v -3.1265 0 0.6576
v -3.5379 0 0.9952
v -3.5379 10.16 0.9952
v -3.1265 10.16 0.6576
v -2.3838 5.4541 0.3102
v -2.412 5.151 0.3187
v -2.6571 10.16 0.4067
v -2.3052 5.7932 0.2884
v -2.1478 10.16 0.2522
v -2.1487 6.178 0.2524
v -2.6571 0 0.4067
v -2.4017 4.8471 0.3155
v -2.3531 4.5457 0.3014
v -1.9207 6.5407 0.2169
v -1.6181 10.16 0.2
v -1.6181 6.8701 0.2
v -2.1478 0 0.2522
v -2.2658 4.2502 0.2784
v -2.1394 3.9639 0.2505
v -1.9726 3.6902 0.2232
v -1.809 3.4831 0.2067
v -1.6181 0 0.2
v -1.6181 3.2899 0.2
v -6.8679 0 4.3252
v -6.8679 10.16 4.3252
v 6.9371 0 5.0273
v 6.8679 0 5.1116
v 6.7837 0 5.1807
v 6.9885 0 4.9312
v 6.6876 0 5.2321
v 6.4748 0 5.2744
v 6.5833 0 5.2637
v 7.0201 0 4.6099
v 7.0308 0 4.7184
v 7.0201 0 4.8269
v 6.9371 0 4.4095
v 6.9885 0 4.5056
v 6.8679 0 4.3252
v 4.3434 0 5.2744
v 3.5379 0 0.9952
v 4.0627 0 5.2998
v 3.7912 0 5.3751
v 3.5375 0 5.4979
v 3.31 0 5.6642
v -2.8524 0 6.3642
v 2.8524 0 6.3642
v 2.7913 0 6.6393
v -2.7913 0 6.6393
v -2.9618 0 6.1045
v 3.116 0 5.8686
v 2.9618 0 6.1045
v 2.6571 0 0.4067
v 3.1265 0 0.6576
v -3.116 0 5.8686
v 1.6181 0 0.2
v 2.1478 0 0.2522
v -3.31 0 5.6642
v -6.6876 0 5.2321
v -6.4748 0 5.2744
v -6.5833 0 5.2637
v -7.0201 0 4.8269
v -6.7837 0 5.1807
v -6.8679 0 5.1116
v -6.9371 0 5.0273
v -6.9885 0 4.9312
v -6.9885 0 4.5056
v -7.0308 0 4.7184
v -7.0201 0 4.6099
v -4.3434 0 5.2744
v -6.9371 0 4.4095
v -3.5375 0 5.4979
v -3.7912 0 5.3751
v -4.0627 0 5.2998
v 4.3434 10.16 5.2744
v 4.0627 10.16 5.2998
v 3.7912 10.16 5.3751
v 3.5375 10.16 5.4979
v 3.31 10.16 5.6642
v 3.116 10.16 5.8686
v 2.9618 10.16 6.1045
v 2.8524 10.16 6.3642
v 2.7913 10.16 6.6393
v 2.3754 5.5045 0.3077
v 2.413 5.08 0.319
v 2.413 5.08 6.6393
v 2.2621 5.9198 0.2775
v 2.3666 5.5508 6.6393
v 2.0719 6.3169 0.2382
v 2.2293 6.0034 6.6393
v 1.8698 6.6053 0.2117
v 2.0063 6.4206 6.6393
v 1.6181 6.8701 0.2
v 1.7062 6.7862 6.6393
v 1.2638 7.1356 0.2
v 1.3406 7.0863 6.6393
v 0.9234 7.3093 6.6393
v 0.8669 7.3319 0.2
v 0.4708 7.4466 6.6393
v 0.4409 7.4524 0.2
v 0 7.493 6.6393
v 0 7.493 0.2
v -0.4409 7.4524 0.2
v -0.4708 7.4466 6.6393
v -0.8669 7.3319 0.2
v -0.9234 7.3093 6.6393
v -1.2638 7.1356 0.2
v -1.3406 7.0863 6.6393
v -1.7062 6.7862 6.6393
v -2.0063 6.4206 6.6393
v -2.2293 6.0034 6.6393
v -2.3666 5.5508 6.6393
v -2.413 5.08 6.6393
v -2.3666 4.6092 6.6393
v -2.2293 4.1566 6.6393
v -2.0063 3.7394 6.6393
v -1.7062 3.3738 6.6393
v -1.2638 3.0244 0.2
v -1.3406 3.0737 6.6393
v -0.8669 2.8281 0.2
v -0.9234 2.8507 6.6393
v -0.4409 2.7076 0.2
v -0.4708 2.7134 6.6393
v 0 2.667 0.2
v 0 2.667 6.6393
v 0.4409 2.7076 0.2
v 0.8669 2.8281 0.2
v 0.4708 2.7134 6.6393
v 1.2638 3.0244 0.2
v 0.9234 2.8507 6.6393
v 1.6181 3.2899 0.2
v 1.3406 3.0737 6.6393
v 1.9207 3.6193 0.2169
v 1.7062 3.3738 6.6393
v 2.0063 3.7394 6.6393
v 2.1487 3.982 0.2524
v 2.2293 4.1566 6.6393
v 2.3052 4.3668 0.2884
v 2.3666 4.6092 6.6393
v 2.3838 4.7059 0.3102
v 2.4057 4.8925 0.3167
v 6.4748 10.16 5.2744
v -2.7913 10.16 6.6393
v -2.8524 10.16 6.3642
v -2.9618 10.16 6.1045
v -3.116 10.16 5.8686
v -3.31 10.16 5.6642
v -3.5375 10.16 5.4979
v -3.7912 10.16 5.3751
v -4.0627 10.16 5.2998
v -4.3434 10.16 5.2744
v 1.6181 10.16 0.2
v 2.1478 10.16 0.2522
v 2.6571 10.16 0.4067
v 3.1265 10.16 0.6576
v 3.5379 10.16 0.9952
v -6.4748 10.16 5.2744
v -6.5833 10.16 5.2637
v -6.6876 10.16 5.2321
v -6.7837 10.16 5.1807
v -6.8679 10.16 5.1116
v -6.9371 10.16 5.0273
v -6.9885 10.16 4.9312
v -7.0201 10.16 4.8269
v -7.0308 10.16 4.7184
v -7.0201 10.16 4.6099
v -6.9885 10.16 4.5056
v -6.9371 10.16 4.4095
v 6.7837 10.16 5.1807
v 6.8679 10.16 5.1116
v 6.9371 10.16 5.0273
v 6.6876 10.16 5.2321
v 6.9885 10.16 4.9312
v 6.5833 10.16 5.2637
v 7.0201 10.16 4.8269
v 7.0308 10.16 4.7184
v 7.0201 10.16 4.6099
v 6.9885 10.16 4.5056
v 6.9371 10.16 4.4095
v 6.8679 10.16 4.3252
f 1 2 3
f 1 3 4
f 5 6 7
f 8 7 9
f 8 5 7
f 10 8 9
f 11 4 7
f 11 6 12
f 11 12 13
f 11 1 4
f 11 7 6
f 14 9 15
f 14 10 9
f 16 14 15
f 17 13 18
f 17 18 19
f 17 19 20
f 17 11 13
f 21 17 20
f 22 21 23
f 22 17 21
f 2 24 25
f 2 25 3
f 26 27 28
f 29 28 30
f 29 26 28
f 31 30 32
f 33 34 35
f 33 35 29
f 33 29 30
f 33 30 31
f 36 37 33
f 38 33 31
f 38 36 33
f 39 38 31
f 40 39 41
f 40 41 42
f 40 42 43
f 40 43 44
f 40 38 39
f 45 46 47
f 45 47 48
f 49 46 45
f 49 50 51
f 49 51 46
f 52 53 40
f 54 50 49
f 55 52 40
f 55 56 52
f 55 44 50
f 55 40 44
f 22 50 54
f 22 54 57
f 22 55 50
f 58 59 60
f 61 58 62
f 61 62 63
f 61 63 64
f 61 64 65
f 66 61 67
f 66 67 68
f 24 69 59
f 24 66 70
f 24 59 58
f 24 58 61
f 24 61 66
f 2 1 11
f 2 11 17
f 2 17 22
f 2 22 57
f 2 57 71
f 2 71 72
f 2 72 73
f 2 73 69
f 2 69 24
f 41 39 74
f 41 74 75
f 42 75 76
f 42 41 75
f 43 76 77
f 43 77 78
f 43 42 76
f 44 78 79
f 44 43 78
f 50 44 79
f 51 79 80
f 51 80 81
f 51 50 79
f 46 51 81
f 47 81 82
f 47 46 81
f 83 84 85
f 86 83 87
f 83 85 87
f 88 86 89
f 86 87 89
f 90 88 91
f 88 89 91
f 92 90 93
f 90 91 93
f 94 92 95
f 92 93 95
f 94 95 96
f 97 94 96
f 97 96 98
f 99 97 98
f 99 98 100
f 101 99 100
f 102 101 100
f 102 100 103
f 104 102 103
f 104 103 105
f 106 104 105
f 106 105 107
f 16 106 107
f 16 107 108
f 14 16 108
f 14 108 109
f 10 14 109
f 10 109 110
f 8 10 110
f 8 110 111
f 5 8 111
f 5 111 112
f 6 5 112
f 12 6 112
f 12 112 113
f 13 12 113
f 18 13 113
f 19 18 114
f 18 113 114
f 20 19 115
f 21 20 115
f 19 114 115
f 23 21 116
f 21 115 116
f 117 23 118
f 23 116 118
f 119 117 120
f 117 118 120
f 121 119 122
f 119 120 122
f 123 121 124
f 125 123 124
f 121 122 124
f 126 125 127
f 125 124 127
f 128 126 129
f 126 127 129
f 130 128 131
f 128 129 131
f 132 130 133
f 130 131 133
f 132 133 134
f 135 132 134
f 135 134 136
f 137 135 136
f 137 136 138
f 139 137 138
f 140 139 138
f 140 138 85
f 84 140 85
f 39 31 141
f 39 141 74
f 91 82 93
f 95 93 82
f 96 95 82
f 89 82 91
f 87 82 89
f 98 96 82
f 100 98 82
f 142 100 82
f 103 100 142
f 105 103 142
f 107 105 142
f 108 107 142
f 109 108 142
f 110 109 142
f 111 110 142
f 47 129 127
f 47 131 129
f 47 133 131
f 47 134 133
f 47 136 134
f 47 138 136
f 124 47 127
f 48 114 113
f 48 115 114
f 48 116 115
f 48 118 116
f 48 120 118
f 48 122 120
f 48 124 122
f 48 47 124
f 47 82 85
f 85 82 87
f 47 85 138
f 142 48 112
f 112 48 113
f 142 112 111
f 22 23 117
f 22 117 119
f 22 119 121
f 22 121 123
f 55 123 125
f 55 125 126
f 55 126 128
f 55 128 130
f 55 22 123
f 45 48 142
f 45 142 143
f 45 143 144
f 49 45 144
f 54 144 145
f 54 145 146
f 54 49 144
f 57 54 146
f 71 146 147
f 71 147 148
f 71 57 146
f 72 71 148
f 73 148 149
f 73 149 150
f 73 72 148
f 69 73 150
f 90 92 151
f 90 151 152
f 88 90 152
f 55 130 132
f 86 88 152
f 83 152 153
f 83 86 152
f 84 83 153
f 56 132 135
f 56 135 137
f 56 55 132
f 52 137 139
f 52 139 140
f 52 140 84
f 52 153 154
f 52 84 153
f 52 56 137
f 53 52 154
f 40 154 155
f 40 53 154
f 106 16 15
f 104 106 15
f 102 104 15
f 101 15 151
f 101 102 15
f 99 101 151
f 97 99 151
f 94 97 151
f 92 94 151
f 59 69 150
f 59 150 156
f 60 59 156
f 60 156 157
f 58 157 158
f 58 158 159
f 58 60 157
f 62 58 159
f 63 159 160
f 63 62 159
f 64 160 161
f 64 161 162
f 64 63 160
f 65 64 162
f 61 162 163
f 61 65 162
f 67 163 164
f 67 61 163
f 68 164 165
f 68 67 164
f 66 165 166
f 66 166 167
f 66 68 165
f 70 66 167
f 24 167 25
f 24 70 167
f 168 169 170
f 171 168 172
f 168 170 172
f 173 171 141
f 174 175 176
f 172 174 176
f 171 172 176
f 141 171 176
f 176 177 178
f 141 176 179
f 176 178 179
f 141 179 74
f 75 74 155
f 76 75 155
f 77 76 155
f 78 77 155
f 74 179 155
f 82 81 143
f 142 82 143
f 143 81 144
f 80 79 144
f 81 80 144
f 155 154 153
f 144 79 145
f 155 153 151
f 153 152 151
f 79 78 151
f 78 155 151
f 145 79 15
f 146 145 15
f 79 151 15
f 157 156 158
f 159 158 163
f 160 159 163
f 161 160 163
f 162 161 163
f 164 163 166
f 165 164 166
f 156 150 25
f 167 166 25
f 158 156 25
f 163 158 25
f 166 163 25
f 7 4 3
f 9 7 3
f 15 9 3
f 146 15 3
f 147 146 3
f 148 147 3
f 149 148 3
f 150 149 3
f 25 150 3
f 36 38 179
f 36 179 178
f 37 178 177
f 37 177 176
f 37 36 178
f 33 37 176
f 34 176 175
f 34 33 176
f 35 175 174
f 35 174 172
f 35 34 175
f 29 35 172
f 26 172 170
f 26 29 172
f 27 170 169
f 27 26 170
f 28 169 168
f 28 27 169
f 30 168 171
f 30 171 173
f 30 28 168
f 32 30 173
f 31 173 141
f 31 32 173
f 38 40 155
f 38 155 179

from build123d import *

# Parameters (mm, degrees)
BOSS_EXTRUDE1_DEPTH = 10.16
SKETCH2_R           = 2.413
CUT_EXTRUDE1_DEPTH  = 7.4393


with BuildPart() as part:
    # Sketch1 → Boss-Extrude1 (new body)
    with BuildSketch(Plane(origin=(0, 0, 0), x_dir=(1, 0, 0), z_dir=(0, 1, 0))):
        with BuildLine():
            Line((-4.3434, -5.2744), (-6.474794456, -5.2744))
            ThreePointArc((-6.474794456, -5.2744), (-6.988471476, -4.931171988), (-6.867945826, -4.32524863))
            Line((-6.867945826, -4.32524863), (-3.537902285, -0.995205089))
            ThreePointArc((-3.537902285, -0.995205089), (-2.657092893, -0.406667069), (-1.618107374, -0.2))
            Line((-1.618107374, -0.2), (1.618107374, -0.2))
            ThreePointArc((1.618107374, -0.2), (2.657092893, -0.406667069), (3.537902285, -0.995205089))
            Line((3.537902285, -0.995205089), (6.867945826, -4.32524863))
            ThreePointArc((6.867945826, -4.32524863), (6.988471476, -4.931171988), (6.474794456, -5.2744))
            Line((6.474794456, -5.2744), (4.343399971, -5.2744))
            ThreePointArc((4.343399971, -5.2744), (3.309975564, -5.66416341), (2.791332959, -6.6393))
            Line((2.791332959, -6.6393), (-2.791332988, -6.6393))
            ThreePointArc((-2.791332988, -6.6393), (-3.309975593, -5.66416341), (-4.3434, -5.2744))
        make_face()
    extrude(amount=BOSS_EXTRUDE1_DEPTH)

    # Sketch2 → Cut-Extrude1 (cut, through all)
    with BuildSketch(Plane.XY.offset(6.6393)):
        with Locations((-1.4e-08, 5.08)):
            Circle(SKETCH2_R)
    extrude(amount=-CUT_EXTRUDE1_DEPTH, mode=Mode.SUBTRACT)


solid = part.part
